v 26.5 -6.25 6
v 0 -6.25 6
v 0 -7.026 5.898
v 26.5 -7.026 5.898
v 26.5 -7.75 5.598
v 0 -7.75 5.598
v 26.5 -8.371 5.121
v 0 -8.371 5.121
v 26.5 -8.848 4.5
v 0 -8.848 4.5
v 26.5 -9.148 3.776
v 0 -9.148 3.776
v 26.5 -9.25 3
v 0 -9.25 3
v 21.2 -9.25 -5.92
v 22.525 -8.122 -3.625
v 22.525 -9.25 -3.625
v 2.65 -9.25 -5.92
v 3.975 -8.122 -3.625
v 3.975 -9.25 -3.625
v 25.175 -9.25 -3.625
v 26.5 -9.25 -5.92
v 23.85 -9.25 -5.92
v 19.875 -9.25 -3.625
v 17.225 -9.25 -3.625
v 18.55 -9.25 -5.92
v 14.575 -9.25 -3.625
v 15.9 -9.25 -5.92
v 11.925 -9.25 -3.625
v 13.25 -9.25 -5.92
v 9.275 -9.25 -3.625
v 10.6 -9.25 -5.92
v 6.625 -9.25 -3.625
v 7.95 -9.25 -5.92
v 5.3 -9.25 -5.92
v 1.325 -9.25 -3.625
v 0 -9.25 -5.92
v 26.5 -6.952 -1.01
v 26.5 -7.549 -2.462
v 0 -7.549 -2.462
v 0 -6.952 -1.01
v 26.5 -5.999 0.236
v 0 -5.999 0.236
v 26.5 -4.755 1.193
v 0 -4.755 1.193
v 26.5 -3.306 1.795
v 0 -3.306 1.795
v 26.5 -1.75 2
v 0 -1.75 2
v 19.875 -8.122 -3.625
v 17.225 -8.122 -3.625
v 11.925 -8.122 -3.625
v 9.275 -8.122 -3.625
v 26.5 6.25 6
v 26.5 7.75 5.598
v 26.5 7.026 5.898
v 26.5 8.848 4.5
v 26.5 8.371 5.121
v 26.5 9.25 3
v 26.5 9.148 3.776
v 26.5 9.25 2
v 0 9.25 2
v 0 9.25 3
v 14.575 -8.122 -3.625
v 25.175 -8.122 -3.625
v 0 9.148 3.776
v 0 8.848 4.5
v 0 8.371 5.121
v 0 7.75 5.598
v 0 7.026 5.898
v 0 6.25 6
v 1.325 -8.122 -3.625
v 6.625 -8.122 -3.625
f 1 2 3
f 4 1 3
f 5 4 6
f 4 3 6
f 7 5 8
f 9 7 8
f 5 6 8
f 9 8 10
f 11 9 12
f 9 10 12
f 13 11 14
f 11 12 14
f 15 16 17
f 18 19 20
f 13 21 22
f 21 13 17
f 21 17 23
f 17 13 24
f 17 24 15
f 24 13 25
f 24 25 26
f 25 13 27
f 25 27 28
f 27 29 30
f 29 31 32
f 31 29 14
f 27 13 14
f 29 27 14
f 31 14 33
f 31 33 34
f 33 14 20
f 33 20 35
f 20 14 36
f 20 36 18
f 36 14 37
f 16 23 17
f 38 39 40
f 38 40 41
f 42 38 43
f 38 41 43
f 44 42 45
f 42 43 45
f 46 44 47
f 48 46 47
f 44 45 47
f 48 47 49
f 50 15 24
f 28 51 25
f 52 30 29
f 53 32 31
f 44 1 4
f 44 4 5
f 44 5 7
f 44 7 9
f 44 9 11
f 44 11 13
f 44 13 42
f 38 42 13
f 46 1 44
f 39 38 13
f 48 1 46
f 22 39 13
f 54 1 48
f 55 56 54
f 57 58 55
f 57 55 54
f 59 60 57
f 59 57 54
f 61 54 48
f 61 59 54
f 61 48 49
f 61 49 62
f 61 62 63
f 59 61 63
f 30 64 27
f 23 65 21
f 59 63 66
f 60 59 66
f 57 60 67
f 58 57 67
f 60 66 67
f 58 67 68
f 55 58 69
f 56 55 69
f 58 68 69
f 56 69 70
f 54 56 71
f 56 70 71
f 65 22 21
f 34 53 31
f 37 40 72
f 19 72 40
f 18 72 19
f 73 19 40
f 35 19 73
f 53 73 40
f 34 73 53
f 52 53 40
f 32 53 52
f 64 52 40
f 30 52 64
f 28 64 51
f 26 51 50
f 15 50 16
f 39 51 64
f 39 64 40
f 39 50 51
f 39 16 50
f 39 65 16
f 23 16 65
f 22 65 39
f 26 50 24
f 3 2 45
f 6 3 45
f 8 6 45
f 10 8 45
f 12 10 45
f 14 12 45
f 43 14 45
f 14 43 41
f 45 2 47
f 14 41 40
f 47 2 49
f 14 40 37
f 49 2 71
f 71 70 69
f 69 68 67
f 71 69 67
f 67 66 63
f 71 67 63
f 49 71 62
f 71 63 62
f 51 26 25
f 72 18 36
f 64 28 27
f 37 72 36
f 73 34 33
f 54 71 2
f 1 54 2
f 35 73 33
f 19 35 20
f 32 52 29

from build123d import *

# Parameters (mm, degrees)
BOSS_EXTRUDE1_DEPTH     = 26.5
CHAMFER1_START          = -5.68864596
CHAMFER1_OUTLINE_W      = 26.5
CHAMFER1_OUTLINE_H      = 7
CHAMFER1_DEPTH          = 3.235738337
CUT_EXTRUDE1_DEPTH      = 33.870959828
CUT_EXTRUDE1_DEPTH_BACK = 33.870959828


with BuildPart() as part:
    # Sketch1 → Boss-Extrude1 (new body)
    with BuildSketch(Plane(origin=(0, 0, 0), x_dir=(0, 0, -1), z_dir=(1, 0, 0))):
        with BuildLine():
            Line((-2, 9.25), (-3, 9.25))
            ThreePointArc((-3, 9.25), (-5.121320344, 8.371320344), (-6, 6.25))
            Line((-6, 6.25), (-6, -6.25))
            ThreePointArc((-6, -6.25), (-5.121320344, -8.371320344), (-3, -9.25))
            Line((-3, -9.25), (6, -9.25))
            Line((6, -9.25), (6, -7.75))
            Line((6, -7.75), (4, -7.75))
            ThreePointArc((4, -7.75), (-0.242640687, -5.992640687), (-2, -1.75))
            Line((-2, -1.75), (-2, 9.25))
        make_face()
    extrude(amount=BOSS_EXTRUDE1_DEPTH)

    # Chamfer1: read off the stored shape, not the designer's step
    # Chamfer1 outline → Chamfer1 (cut)
    with BuildSketch(Plane(origin=(0, 0, 0), x_dir=(1, 0, 0), z_dir=(0, 0.897390589003635, -0.441237046005556)).offset(CHAMFER1_START)):
        with Locations((13.25, 7.5)):
            Rectangle(CHAMFER1_OUTLINE_W, CHAMFER1_OUTLINE_H)
    extrude(amount=CHAMFER1_DEPTH, mode=Mode.SUBTRACT)

    # Sketch2 → Cut-Extrude1 (cut, two sides: drawn at the far end of the back side and taken through both)
    with BuildSketch(Plane.XZ.offset(9.25).offset(-CUT_EXTRUDE1_DEPTH_BACK)):
        Polygon((23.85, -5.920212303), (26.5, -5.920212303), (25.175, -3.625244983), align=None)
        Polygon((21.2, -5.920212303), (23.85, -5.920212303), (22.525, -3.625244983), align=None)
        Polygon((18.55, -5.920212303), (21.2, -5.920212303), (19.875, -3.625244983), align=None)
        Polygon((15.9, -5.920212303), (18.55, -5.920212303), (17.225, -3.625244983), align=None)
        Polygon((13.25, -5.920212303), (15.9, -5.920212303), (14.575, -3.625244983), align=None)
        Polygon((10.6, -5.920212303), (13.25, -5.920212303), (11.925, -3.625244983), align=None)
        Polygon((7.95, -5.920212303), (10.6, -5.920212303), (9.275, -3.625244983), align=None)
        Polygon((5.3, -5.920212303), (7.95, -5.920212303), (6.625, -3.625244983), align=None)
        Polygon((2.65, -5.920212303), (5.3, -5.920212303), (3.975, -3.625244983), align=None)
        Polygon((2.65, -5.920212303), (1.325, -3.625244983), (0, -5.920212303), align=None)
    extrude(amount=CUT_EXTRUDE1_DEPTH + CUT_EXTRUDE1_DEPTH_BACK, mode=Mode.SUBTRACT)


solid = part.part
